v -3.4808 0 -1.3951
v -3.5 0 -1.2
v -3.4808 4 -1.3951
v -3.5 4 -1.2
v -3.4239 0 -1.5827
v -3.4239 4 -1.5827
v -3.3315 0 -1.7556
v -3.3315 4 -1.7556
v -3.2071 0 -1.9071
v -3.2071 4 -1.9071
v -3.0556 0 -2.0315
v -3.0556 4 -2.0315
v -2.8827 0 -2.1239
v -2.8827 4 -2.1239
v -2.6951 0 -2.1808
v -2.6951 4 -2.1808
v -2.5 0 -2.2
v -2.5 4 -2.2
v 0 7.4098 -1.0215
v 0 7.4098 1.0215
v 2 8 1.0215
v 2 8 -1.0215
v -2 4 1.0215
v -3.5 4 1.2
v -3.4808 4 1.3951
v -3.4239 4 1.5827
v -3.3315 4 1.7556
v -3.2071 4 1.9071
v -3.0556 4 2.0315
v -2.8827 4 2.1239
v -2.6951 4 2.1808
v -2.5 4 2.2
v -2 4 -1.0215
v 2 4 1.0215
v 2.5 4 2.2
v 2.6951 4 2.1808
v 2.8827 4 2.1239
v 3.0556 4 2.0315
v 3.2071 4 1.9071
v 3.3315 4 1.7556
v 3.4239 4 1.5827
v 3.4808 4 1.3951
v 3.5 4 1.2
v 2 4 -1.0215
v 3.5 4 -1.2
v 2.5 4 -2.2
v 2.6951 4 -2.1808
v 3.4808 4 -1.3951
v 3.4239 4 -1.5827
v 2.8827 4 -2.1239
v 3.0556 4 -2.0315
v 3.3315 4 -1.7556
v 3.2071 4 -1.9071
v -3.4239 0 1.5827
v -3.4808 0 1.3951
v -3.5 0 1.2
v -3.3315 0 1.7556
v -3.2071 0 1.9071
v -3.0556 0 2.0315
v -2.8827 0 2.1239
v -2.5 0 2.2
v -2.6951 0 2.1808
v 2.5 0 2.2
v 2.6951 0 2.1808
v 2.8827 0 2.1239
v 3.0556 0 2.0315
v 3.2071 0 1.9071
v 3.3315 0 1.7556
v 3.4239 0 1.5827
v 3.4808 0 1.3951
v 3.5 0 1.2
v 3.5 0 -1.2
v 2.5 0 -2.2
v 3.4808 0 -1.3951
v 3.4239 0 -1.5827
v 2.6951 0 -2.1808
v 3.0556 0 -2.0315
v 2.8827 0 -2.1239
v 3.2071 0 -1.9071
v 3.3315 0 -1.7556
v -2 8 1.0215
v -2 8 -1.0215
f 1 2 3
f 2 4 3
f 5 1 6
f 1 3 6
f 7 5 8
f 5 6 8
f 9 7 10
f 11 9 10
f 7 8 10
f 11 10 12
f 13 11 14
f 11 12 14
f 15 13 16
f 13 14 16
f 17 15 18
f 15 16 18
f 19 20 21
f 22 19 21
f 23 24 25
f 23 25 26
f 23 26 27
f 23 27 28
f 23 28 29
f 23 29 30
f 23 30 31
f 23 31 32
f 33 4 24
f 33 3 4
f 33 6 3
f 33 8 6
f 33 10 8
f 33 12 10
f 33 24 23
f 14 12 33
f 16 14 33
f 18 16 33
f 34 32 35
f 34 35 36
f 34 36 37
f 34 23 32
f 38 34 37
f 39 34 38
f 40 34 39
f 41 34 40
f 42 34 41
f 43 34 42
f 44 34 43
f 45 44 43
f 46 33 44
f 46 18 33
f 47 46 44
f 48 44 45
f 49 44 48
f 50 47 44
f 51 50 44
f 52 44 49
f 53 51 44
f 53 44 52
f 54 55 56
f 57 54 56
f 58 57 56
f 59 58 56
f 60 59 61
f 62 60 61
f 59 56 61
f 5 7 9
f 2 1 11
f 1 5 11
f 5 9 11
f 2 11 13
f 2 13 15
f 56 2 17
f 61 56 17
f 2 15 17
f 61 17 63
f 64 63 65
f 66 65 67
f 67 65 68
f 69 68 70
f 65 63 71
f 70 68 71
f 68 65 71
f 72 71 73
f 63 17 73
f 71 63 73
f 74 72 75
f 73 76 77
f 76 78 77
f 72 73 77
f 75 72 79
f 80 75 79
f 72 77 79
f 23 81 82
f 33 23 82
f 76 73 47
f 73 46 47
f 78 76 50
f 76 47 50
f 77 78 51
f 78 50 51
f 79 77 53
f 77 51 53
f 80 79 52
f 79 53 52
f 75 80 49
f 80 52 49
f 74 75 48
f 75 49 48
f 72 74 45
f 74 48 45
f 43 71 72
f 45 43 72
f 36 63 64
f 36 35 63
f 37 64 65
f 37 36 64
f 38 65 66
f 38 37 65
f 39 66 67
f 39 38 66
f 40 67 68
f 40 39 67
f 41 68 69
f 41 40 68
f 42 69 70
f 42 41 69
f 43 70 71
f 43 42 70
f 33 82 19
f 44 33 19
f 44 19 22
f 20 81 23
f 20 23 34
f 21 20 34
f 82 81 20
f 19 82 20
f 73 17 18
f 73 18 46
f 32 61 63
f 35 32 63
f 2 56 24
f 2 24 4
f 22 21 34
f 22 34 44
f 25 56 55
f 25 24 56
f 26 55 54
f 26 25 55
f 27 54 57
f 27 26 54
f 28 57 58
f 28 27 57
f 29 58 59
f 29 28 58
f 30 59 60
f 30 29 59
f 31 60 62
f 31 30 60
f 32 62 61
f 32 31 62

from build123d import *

# Parameters (mm, degrees)
CROQUIS1_W                 = 7
CROQUIS1_H                 = 4.4
SALIENTE_EXTRUIR1_DEPTH    = 8
CROQUIS2_OUTSIDE_W         = 11.3
CROQUIS2_OUTSIDE_H         = 8.7
CROQUIS2_OUTSIDE_W_2       = 4
CROQUIS2_OUTSIDE_H_2       = 2.04309095
CORTAR_EXTRUIR1_DEPTH      = 4
REDONDEO1_R                = 1
CORTAR_EXTRUIR2_DEPTH      = 2.178454525
CORTAR_EXTRUIR2_DEPTH_BACK = 4.221545475


with BuildPart() as part:
    # Croquis1 → Saliente-Extruir1 (new body)
    with BuildSketch(Plane(origin=(0, 0, 0), x_dir=(1, 0, 0), z_dir=(0, 1, 0))):
        Rectangle(CROQUIS1_W, CROQUIS1_H)
    extrude(amount=SALIENTE_EXTRUIR1_DEPTH)

    # Croquis2 outside → Cortar-Extruir1 (cut)
    with BuildSketch(Plane(origin=(0, 8, 0), x_dir=(1, 0, 0), z_dir=(0, 1, 0))):
        Rectangle(CROQUIS2_OUTSIDE_W, CROQUIS2_OUTSIDE_H)
        Rectangle(CROQUIS2_OUTSIDE_W_2, CROQUIS2_OUTSIDE_H_2, mode=Mode.SUBTRACT)
    extrude(amount=-CORTAR_EXTRUIR1_DEPTH, mode=Mode.SUBTRACT)

    # Redondeo1
    redondeo1_edges = [part.edges().sort_by_distance(p)[0] for p in [
        (3.5, 2, 2.2),
        (-3.5, 2, 2.2),
        (-3.5, 2, -2.2),
        (3.5, 2, -2.2),
    ]]
    fillet(redondeo1_edges, radius=REDONDEO1_R)

    # Croquis3 → Cortar-Extruir2 (cut, two sides)
    with BuildSketch(Plane.XY.offset(1.021545475)) as cortar_extruir2_sk:
        Polygon((-30.213727446, 16.325583484), (-2, 8), (0, 7.409820379), (2, 8), (30.213727446, 16.325583484), (30.213727446, 75.158559162), (-30.213727446, 75.158559162), align=None)
    extrude(amount=CORTAR_EXTRUIR2_DEPTH, mode=Mode.SUBTRACT)
    extrude(cortar_extruir2_sk.sketch, amount=-CORTAR_EXTRUIR2_DEPTH_BACK, mode=Mode.SUBTRACT)


solid = part.part
